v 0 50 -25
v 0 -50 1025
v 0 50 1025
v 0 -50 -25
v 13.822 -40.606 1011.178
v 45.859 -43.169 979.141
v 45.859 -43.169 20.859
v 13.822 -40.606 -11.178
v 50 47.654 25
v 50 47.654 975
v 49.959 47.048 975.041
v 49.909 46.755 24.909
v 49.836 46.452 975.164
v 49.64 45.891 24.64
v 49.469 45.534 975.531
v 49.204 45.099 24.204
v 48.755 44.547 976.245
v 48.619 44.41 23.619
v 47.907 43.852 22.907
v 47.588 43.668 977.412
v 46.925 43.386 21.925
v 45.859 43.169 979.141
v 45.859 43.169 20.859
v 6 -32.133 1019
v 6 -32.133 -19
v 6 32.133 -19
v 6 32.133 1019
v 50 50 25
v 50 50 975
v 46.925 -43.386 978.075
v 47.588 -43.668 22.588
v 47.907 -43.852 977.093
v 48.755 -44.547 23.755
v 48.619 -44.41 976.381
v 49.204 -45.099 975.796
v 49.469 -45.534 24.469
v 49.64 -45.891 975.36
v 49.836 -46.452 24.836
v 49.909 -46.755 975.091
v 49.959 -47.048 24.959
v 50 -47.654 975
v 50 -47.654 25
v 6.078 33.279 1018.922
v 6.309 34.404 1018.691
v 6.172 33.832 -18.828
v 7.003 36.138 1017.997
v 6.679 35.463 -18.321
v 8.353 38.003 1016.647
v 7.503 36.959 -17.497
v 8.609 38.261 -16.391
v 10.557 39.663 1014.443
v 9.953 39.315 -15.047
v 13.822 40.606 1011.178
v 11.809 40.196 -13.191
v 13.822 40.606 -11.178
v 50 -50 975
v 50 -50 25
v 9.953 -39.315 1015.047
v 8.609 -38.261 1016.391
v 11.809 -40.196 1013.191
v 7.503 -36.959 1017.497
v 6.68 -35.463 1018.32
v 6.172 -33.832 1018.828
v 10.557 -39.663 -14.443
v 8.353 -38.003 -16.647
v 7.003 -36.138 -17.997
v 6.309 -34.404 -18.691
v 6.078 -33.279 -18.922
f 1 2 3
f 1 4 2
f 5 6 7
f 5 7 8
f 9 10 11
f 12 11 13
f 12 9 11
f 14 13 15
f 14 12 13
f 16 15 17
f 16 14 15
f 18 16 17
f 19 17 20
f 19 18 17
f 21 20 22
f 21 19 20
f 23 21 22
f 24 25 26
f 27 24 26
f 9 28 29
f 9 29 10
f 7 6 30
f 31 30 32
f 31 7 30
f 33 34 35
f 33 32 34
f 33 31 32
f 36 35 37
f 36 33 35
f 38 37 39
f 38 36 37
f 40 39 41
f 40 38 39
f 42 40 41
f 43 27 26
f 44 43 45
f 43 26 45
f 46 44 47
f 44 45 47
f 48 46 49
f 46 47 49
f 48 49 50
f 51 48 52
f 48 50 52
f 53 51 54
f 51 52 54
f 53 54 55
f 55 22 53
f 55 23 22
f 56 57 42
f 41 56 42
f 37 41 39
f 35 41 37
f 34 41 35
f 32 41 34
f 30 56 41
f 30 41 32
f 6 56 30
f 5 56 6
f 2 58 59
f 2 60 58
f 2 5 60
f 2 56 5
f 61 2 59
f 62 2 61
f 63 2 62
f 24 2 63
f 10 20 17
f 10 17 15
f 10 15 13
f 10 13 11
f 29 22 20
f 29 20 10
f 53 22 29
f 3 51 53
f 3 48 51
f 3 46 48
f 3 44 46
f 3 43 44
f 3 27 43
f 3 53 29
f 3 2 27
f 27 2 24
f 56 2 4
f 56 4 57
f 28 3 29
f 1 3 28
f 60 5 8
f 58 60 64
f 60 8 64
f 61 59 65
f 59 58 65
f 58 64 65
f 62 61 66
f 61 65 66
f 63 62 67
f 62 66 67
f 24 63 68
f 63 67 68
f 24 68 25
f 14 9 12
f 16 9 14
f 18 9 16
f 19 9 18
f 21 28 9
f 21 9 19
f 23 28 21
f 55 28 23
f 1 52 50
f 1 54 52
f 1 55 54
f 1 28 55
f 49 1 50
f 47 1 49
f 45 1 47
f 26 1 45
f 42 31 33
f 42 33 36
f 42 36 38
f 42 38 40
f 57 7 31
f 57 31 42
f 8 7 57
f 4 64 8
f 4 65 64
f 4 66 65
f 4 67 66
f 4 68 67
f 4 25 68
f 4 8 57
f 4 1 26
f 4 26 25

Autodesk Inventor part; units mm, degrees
ref_plane "Начальная плоскость" through (0, 0, -25) normal (0, 0, 1) x (1, 0, 0)
ref_plane "Конечная плоскость" through (0, 0, 1025) normal (0, 0, 1) x (1, 0, 0)
sketch "Эскиз" plane through (0, 0, 0) normal (0, 0, 1) x (1, 0, 0)
  line L0 (0, 0) -> (0, 50)
  line L1 (0, 50) -> (50, 50)
  line L2 (50, 50) -> (50, 47.6544)
  line L3 (45.8589, 43.1687) -> (13.8222, 40.6058)
  line L4 (6, 32.1328) -> (6, 0)
  line L5 (6, 0) -> (0, 0) construction
  line L6 (25, 50) -> (25, 41.5) construction
  line L7 (50, 43.5) -> (50, 41.5) construction
  line L8 (50, 41.5) -> (25, 41.5) construction
  line L9 (0, 15) -> (0, -27) construction
  line L10 (-5.539, 0) -> (16.0067, 0) construction
  line L11 (0, 0) -> (0, -50)
  line L12 (0, -50) -> (50, -50)
  line L13 (50, -50) -> (50, -47.6544)
  line L14 (45.8589, -43.1687) -> (13.8222, -40.6058)
  line L15 (6, -32.1328) -> (6, 0)
  arc A0 (13.8222, 40.6058) -> (6, 32.1328) centre (14.5, 32.1328) ccw
  arc A1 (6, -32.1328) -> (13.8222, -40.6058) centre (14.5, -32.1328) ccw
  arc A2 (45.8589, 43.1687) -> (50, 47.6544) centre (45.5, 47.6544) ccw
  arc A3 (50, -47.6544) -> (45.8589, -43.1687) centre (45.5, -47.6544) ccw
  line L16 (0, 70) -> (0, -70) construction
  line L17 (-16.8222, 0) -> (62.1602, 0) construction
  point P0 (6, 39.98)
  point P1 (50, -43.5)
  point P2 (6, -39.98)
  point P3 (25, -50)
  point P4 (25, -41.5)
  dimension "d0" = 6
  dimension "d1" = 50
  dimension "d2" = 50
  dimension "d3" = 8.5
  dimension "d4" = 25
  dimension "d5" = 2
  dimension "d23" = 8.5
  dimension "d24" = 4.5
  dimension "d25" = 0
extrude "Тело" add sketch "Эскиз" along normal up to surface (1050 mm away) from surface at -25
sketch "Sketch3" plane through (0, 0, 0) normal (0, 0, 1) x (1, 0, 0)
  line L0 (0, 0) -> (10, 0)
ref_plane "Work Plane3" through (0, 0, 0) normal (0, -1, 0) x (1, 0, 0)
sketch "Sketch4" plane through (0, 0, 0) normal (0, -1, 0) x (1, 0, 0)
  line L0 (-2, -25) -> (12, -25)
  line L1 (-2, 1025) -> (12, 1025)
  dimension "d29" = 1050
ref_plane "РабПлоскость4" through (0, 0, -25) normal (0.7071, 0, -0.7071) x (-0.7071, 0, -0.7071)
split "Разделение1" plane through (0, 0, -25) removes the side toward (0.7071, 0, -0.7071)
ref_plane "РабПлоскость5" through (0, 0, 1025) normal (0.7071, 0, 0.7071) x (0.7071, 0, -0.7071)
split "Разделение2" plane through (0, 0, 1025) removes the side toward (0.7071, 0, 0.7071)
equation "\"d0\" = G_T"
equation "\"d1\" = 0.5 * G_H"
equation "\"d2\" = G_W"
equation "\"d3\" = G_T1"
equation "\"d4\" = G_C"
equation "\"d23\" = G_IR"
equation "\"d24\" = G_ER"
equation "\"d6\" = G_L"
equation "\"G_W\" = 50"
equation "\"G_T\" = 6"
equation "\"G_T1\" = 8.5"
equation "\"G_NG\" = 0.08"
equation "\"G_ER\" = 4.5"
equation "\"G_IR\" = 8.5"
equation "\"G_C\" = 25"
equation "\"G_L\" = d29"
equation "\"ex\" = 0"
equation "\"G_OFFSET_START\" = 25"
equation "\"G_OFFSET_END\" = 25"
equation "\"d26\" = -G_OFFSET_START"
equation "\"d27\" = G_OFFSET_END + B_L"
equation "\"G_H\" = 100"
equation "\"B_L\" = 1000"
properties part number "DIN1026 - U 100 - 1050" material "Сталь, углеродистая"
